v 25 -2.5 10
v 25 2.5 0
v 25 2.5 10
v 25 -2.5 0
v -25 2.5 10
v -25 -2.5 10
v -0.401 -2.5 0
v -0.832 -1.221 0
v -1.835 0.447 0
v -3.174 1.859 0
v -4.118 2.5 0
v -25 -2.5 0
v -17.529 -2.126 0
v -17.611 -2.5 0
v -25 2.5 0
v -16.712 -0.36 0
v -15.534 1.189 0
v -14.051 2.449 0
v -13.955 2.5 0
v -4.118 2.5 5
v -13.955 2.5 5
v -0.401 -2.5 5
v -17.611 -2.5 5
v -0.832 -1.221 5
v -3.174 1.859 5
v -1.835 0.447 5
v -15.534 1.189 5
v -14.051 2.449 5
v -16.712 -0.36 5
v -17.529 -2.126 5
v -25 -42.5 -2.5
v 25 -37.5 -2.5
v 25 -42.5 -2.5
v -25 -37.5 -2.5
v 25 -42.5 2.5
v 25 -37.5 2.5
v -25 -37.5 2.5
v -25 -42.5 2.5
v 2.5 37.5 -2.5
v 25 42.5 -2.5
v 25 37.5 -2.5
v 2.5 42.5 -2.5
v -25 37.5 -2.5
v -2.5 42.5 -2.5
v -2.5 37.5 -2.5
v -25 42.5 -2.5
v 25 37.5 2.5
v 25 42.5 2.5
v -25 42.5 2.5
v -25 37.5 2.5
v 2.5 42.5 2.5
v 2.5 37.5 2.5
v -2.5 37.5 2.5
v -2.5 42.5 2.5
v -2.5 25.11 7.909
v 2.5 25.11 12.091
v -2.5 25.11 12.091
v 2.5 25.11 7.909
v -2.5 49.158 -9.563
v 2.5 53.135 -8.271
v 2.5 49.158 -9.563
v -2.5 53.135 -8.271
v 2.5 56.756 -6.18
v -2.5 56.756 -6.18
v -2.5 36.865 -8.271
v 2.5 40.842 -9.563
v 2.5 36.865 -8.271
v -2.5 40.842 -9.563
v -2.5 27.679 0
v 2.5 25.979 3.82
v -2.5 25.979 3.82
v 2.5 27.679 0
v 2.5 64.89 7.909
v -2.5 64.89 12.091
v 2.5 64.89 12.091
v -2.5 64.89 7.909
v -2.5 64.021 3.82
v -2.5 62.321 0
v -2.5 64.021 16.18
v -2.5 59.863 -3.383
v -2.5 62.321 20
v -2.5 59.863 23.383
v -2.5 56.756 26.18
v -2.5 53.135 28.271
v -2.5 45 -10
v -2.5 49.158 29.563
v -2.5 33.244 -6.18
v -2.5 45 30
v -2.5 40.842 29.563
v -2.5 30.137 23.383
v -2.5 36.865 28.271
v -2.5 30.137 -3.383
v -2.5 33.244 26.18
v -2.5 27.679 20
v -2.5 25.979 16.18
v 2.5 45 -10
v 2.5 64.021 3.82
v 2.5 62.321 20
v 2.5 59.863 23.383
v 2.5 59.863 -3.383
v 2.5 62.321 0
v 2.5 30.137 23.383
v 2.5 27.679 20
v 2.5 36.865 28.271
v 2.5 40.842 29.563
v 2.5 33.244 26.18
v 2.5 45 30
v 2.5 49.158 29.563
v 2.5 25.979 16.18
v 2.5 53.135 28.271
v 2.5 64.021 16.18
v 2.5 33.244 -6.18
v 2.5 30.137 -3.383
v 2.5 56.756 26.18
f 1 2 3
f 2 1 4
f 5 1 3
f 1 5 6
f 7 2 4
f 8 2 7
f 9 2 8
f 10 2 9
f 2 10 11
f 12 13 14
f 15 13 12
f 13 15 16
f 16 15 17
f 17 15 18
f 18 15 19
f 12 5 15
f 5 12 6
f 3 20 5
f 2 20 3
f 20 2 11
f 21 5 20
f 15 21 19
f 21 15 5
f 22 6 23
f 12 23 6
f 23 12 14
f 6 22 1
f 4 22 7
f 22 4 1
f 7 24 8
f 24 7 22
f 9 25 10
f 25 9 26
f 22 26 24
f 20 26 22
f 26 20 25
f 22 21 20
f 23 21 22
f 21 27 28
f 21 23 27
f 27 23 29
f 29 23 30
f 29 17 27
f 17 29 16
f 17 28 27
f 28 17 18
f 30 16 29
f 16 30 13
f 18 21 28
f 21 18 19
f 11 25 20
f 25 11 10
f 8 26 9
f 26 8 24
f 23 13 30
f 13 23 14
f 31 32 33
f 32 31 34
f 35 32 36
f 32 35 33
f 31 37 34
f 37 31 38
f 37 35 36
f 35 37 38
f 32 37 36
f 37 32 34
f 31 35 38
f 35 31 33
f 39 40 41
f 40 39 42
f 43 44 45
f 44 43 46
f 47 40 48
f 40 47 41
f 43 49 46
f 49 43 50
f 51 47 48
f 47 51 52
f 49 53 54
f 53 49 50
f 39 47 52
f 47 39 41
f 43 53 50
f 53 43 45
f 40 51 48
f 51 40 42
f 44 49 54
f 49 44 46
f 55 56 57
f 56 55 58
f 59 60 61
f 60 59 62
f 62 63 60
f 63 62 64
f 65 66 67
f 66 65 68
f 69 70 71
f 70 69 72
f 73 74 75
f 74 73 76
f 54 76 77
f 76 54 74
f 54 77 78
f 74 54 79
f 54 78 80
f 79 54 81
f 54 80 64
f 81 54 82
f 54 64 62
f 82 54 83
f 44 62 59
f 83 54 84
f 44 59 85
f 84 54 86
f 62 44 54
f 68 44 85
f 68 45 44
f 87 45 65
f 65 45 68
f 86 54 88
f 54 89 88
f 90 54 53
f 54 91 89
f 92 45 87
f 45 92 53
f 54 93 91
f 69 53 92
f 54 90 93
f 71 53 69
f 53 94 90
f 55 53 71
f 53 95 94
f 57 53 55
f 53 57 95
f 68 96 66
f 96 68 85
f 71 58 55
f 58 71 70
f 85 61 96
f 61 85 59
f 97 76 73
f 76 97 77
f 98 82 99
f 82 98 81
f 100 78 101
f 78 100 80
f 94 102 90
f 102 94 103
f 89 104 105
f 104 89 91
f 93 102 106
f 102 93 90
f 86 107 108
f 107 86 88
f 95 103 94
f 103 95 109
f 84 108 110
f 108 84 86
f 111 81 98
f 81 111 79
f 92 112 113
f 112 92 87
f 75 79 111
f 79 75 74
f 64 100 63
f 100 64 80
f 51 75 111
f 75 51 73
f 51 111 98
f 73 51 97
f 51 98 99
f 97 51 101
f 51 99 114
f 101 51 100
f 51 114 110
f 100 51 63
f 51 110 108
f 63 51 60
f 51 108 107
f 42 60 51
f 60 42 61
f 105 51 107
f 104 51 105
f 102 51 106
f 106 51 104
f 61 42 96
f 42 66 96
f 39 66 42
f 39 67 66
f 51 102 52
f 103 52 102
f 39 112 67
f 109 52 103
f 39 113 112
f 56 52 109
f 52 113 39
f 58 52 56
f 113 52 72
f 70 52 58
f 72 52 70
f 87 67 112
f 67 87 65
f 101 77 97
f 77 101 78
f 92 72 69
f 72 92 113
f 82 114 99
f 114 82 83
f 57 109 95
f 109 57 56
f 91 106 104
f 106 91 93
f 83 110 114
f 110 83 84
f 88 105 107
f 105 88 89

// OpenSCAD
// Parameters
part_width = 50;          // Width of the entire part
thickness_a_c = 5;        // Thickness of parts A and C
diameter_b = 40;          // Diameter of the mask holder (B)
hose_diameter = 18;       // Diameter of the hose for A
support_spacing = 80;     // Distance between the two supports (C)
bed_angle = 90;           // Angle for bed attachment, default is 90 degrees (right angle)

// Main Assembly
module cpap_holder() {
    hose_holder();
    mask_holder();
    supports();
}

// A: Hose Holder
module hose_holder() {
    translate([-part_width / 2, -thickness_a_c / 2, 0])
        difference() {
            cube([part_width, thickness_a_c, thickness_a_c * 2]);
            translate([(part_width - hose_diameter) / 2, -thickness_a_c / 2, 0])
                cylinder(h=thickness_a_c * 2, d=hose_diameter, center=true);
        }
}

// B: Mask Holder
module mask_holder() {
    translate([0, support_spacing / 2 + thickness_a_c, thickness_a_c * 2])
        rotate([0, bed_angle, 0])
            cylinder(h=thickness_a_c, d=diameter_b, center=true);
}

// C: Support Structure
module supports() {
    for (y = [-support_spacing / 2, support_spacing / 2]) {
        translate([0, y, 0])
            rotate([0, bed_angle, 0])
                cube([thickness_a_c, thickness_a_c, part_width], center=true);
    }
}

// Render the CPAP Holder
cpap_holder();
